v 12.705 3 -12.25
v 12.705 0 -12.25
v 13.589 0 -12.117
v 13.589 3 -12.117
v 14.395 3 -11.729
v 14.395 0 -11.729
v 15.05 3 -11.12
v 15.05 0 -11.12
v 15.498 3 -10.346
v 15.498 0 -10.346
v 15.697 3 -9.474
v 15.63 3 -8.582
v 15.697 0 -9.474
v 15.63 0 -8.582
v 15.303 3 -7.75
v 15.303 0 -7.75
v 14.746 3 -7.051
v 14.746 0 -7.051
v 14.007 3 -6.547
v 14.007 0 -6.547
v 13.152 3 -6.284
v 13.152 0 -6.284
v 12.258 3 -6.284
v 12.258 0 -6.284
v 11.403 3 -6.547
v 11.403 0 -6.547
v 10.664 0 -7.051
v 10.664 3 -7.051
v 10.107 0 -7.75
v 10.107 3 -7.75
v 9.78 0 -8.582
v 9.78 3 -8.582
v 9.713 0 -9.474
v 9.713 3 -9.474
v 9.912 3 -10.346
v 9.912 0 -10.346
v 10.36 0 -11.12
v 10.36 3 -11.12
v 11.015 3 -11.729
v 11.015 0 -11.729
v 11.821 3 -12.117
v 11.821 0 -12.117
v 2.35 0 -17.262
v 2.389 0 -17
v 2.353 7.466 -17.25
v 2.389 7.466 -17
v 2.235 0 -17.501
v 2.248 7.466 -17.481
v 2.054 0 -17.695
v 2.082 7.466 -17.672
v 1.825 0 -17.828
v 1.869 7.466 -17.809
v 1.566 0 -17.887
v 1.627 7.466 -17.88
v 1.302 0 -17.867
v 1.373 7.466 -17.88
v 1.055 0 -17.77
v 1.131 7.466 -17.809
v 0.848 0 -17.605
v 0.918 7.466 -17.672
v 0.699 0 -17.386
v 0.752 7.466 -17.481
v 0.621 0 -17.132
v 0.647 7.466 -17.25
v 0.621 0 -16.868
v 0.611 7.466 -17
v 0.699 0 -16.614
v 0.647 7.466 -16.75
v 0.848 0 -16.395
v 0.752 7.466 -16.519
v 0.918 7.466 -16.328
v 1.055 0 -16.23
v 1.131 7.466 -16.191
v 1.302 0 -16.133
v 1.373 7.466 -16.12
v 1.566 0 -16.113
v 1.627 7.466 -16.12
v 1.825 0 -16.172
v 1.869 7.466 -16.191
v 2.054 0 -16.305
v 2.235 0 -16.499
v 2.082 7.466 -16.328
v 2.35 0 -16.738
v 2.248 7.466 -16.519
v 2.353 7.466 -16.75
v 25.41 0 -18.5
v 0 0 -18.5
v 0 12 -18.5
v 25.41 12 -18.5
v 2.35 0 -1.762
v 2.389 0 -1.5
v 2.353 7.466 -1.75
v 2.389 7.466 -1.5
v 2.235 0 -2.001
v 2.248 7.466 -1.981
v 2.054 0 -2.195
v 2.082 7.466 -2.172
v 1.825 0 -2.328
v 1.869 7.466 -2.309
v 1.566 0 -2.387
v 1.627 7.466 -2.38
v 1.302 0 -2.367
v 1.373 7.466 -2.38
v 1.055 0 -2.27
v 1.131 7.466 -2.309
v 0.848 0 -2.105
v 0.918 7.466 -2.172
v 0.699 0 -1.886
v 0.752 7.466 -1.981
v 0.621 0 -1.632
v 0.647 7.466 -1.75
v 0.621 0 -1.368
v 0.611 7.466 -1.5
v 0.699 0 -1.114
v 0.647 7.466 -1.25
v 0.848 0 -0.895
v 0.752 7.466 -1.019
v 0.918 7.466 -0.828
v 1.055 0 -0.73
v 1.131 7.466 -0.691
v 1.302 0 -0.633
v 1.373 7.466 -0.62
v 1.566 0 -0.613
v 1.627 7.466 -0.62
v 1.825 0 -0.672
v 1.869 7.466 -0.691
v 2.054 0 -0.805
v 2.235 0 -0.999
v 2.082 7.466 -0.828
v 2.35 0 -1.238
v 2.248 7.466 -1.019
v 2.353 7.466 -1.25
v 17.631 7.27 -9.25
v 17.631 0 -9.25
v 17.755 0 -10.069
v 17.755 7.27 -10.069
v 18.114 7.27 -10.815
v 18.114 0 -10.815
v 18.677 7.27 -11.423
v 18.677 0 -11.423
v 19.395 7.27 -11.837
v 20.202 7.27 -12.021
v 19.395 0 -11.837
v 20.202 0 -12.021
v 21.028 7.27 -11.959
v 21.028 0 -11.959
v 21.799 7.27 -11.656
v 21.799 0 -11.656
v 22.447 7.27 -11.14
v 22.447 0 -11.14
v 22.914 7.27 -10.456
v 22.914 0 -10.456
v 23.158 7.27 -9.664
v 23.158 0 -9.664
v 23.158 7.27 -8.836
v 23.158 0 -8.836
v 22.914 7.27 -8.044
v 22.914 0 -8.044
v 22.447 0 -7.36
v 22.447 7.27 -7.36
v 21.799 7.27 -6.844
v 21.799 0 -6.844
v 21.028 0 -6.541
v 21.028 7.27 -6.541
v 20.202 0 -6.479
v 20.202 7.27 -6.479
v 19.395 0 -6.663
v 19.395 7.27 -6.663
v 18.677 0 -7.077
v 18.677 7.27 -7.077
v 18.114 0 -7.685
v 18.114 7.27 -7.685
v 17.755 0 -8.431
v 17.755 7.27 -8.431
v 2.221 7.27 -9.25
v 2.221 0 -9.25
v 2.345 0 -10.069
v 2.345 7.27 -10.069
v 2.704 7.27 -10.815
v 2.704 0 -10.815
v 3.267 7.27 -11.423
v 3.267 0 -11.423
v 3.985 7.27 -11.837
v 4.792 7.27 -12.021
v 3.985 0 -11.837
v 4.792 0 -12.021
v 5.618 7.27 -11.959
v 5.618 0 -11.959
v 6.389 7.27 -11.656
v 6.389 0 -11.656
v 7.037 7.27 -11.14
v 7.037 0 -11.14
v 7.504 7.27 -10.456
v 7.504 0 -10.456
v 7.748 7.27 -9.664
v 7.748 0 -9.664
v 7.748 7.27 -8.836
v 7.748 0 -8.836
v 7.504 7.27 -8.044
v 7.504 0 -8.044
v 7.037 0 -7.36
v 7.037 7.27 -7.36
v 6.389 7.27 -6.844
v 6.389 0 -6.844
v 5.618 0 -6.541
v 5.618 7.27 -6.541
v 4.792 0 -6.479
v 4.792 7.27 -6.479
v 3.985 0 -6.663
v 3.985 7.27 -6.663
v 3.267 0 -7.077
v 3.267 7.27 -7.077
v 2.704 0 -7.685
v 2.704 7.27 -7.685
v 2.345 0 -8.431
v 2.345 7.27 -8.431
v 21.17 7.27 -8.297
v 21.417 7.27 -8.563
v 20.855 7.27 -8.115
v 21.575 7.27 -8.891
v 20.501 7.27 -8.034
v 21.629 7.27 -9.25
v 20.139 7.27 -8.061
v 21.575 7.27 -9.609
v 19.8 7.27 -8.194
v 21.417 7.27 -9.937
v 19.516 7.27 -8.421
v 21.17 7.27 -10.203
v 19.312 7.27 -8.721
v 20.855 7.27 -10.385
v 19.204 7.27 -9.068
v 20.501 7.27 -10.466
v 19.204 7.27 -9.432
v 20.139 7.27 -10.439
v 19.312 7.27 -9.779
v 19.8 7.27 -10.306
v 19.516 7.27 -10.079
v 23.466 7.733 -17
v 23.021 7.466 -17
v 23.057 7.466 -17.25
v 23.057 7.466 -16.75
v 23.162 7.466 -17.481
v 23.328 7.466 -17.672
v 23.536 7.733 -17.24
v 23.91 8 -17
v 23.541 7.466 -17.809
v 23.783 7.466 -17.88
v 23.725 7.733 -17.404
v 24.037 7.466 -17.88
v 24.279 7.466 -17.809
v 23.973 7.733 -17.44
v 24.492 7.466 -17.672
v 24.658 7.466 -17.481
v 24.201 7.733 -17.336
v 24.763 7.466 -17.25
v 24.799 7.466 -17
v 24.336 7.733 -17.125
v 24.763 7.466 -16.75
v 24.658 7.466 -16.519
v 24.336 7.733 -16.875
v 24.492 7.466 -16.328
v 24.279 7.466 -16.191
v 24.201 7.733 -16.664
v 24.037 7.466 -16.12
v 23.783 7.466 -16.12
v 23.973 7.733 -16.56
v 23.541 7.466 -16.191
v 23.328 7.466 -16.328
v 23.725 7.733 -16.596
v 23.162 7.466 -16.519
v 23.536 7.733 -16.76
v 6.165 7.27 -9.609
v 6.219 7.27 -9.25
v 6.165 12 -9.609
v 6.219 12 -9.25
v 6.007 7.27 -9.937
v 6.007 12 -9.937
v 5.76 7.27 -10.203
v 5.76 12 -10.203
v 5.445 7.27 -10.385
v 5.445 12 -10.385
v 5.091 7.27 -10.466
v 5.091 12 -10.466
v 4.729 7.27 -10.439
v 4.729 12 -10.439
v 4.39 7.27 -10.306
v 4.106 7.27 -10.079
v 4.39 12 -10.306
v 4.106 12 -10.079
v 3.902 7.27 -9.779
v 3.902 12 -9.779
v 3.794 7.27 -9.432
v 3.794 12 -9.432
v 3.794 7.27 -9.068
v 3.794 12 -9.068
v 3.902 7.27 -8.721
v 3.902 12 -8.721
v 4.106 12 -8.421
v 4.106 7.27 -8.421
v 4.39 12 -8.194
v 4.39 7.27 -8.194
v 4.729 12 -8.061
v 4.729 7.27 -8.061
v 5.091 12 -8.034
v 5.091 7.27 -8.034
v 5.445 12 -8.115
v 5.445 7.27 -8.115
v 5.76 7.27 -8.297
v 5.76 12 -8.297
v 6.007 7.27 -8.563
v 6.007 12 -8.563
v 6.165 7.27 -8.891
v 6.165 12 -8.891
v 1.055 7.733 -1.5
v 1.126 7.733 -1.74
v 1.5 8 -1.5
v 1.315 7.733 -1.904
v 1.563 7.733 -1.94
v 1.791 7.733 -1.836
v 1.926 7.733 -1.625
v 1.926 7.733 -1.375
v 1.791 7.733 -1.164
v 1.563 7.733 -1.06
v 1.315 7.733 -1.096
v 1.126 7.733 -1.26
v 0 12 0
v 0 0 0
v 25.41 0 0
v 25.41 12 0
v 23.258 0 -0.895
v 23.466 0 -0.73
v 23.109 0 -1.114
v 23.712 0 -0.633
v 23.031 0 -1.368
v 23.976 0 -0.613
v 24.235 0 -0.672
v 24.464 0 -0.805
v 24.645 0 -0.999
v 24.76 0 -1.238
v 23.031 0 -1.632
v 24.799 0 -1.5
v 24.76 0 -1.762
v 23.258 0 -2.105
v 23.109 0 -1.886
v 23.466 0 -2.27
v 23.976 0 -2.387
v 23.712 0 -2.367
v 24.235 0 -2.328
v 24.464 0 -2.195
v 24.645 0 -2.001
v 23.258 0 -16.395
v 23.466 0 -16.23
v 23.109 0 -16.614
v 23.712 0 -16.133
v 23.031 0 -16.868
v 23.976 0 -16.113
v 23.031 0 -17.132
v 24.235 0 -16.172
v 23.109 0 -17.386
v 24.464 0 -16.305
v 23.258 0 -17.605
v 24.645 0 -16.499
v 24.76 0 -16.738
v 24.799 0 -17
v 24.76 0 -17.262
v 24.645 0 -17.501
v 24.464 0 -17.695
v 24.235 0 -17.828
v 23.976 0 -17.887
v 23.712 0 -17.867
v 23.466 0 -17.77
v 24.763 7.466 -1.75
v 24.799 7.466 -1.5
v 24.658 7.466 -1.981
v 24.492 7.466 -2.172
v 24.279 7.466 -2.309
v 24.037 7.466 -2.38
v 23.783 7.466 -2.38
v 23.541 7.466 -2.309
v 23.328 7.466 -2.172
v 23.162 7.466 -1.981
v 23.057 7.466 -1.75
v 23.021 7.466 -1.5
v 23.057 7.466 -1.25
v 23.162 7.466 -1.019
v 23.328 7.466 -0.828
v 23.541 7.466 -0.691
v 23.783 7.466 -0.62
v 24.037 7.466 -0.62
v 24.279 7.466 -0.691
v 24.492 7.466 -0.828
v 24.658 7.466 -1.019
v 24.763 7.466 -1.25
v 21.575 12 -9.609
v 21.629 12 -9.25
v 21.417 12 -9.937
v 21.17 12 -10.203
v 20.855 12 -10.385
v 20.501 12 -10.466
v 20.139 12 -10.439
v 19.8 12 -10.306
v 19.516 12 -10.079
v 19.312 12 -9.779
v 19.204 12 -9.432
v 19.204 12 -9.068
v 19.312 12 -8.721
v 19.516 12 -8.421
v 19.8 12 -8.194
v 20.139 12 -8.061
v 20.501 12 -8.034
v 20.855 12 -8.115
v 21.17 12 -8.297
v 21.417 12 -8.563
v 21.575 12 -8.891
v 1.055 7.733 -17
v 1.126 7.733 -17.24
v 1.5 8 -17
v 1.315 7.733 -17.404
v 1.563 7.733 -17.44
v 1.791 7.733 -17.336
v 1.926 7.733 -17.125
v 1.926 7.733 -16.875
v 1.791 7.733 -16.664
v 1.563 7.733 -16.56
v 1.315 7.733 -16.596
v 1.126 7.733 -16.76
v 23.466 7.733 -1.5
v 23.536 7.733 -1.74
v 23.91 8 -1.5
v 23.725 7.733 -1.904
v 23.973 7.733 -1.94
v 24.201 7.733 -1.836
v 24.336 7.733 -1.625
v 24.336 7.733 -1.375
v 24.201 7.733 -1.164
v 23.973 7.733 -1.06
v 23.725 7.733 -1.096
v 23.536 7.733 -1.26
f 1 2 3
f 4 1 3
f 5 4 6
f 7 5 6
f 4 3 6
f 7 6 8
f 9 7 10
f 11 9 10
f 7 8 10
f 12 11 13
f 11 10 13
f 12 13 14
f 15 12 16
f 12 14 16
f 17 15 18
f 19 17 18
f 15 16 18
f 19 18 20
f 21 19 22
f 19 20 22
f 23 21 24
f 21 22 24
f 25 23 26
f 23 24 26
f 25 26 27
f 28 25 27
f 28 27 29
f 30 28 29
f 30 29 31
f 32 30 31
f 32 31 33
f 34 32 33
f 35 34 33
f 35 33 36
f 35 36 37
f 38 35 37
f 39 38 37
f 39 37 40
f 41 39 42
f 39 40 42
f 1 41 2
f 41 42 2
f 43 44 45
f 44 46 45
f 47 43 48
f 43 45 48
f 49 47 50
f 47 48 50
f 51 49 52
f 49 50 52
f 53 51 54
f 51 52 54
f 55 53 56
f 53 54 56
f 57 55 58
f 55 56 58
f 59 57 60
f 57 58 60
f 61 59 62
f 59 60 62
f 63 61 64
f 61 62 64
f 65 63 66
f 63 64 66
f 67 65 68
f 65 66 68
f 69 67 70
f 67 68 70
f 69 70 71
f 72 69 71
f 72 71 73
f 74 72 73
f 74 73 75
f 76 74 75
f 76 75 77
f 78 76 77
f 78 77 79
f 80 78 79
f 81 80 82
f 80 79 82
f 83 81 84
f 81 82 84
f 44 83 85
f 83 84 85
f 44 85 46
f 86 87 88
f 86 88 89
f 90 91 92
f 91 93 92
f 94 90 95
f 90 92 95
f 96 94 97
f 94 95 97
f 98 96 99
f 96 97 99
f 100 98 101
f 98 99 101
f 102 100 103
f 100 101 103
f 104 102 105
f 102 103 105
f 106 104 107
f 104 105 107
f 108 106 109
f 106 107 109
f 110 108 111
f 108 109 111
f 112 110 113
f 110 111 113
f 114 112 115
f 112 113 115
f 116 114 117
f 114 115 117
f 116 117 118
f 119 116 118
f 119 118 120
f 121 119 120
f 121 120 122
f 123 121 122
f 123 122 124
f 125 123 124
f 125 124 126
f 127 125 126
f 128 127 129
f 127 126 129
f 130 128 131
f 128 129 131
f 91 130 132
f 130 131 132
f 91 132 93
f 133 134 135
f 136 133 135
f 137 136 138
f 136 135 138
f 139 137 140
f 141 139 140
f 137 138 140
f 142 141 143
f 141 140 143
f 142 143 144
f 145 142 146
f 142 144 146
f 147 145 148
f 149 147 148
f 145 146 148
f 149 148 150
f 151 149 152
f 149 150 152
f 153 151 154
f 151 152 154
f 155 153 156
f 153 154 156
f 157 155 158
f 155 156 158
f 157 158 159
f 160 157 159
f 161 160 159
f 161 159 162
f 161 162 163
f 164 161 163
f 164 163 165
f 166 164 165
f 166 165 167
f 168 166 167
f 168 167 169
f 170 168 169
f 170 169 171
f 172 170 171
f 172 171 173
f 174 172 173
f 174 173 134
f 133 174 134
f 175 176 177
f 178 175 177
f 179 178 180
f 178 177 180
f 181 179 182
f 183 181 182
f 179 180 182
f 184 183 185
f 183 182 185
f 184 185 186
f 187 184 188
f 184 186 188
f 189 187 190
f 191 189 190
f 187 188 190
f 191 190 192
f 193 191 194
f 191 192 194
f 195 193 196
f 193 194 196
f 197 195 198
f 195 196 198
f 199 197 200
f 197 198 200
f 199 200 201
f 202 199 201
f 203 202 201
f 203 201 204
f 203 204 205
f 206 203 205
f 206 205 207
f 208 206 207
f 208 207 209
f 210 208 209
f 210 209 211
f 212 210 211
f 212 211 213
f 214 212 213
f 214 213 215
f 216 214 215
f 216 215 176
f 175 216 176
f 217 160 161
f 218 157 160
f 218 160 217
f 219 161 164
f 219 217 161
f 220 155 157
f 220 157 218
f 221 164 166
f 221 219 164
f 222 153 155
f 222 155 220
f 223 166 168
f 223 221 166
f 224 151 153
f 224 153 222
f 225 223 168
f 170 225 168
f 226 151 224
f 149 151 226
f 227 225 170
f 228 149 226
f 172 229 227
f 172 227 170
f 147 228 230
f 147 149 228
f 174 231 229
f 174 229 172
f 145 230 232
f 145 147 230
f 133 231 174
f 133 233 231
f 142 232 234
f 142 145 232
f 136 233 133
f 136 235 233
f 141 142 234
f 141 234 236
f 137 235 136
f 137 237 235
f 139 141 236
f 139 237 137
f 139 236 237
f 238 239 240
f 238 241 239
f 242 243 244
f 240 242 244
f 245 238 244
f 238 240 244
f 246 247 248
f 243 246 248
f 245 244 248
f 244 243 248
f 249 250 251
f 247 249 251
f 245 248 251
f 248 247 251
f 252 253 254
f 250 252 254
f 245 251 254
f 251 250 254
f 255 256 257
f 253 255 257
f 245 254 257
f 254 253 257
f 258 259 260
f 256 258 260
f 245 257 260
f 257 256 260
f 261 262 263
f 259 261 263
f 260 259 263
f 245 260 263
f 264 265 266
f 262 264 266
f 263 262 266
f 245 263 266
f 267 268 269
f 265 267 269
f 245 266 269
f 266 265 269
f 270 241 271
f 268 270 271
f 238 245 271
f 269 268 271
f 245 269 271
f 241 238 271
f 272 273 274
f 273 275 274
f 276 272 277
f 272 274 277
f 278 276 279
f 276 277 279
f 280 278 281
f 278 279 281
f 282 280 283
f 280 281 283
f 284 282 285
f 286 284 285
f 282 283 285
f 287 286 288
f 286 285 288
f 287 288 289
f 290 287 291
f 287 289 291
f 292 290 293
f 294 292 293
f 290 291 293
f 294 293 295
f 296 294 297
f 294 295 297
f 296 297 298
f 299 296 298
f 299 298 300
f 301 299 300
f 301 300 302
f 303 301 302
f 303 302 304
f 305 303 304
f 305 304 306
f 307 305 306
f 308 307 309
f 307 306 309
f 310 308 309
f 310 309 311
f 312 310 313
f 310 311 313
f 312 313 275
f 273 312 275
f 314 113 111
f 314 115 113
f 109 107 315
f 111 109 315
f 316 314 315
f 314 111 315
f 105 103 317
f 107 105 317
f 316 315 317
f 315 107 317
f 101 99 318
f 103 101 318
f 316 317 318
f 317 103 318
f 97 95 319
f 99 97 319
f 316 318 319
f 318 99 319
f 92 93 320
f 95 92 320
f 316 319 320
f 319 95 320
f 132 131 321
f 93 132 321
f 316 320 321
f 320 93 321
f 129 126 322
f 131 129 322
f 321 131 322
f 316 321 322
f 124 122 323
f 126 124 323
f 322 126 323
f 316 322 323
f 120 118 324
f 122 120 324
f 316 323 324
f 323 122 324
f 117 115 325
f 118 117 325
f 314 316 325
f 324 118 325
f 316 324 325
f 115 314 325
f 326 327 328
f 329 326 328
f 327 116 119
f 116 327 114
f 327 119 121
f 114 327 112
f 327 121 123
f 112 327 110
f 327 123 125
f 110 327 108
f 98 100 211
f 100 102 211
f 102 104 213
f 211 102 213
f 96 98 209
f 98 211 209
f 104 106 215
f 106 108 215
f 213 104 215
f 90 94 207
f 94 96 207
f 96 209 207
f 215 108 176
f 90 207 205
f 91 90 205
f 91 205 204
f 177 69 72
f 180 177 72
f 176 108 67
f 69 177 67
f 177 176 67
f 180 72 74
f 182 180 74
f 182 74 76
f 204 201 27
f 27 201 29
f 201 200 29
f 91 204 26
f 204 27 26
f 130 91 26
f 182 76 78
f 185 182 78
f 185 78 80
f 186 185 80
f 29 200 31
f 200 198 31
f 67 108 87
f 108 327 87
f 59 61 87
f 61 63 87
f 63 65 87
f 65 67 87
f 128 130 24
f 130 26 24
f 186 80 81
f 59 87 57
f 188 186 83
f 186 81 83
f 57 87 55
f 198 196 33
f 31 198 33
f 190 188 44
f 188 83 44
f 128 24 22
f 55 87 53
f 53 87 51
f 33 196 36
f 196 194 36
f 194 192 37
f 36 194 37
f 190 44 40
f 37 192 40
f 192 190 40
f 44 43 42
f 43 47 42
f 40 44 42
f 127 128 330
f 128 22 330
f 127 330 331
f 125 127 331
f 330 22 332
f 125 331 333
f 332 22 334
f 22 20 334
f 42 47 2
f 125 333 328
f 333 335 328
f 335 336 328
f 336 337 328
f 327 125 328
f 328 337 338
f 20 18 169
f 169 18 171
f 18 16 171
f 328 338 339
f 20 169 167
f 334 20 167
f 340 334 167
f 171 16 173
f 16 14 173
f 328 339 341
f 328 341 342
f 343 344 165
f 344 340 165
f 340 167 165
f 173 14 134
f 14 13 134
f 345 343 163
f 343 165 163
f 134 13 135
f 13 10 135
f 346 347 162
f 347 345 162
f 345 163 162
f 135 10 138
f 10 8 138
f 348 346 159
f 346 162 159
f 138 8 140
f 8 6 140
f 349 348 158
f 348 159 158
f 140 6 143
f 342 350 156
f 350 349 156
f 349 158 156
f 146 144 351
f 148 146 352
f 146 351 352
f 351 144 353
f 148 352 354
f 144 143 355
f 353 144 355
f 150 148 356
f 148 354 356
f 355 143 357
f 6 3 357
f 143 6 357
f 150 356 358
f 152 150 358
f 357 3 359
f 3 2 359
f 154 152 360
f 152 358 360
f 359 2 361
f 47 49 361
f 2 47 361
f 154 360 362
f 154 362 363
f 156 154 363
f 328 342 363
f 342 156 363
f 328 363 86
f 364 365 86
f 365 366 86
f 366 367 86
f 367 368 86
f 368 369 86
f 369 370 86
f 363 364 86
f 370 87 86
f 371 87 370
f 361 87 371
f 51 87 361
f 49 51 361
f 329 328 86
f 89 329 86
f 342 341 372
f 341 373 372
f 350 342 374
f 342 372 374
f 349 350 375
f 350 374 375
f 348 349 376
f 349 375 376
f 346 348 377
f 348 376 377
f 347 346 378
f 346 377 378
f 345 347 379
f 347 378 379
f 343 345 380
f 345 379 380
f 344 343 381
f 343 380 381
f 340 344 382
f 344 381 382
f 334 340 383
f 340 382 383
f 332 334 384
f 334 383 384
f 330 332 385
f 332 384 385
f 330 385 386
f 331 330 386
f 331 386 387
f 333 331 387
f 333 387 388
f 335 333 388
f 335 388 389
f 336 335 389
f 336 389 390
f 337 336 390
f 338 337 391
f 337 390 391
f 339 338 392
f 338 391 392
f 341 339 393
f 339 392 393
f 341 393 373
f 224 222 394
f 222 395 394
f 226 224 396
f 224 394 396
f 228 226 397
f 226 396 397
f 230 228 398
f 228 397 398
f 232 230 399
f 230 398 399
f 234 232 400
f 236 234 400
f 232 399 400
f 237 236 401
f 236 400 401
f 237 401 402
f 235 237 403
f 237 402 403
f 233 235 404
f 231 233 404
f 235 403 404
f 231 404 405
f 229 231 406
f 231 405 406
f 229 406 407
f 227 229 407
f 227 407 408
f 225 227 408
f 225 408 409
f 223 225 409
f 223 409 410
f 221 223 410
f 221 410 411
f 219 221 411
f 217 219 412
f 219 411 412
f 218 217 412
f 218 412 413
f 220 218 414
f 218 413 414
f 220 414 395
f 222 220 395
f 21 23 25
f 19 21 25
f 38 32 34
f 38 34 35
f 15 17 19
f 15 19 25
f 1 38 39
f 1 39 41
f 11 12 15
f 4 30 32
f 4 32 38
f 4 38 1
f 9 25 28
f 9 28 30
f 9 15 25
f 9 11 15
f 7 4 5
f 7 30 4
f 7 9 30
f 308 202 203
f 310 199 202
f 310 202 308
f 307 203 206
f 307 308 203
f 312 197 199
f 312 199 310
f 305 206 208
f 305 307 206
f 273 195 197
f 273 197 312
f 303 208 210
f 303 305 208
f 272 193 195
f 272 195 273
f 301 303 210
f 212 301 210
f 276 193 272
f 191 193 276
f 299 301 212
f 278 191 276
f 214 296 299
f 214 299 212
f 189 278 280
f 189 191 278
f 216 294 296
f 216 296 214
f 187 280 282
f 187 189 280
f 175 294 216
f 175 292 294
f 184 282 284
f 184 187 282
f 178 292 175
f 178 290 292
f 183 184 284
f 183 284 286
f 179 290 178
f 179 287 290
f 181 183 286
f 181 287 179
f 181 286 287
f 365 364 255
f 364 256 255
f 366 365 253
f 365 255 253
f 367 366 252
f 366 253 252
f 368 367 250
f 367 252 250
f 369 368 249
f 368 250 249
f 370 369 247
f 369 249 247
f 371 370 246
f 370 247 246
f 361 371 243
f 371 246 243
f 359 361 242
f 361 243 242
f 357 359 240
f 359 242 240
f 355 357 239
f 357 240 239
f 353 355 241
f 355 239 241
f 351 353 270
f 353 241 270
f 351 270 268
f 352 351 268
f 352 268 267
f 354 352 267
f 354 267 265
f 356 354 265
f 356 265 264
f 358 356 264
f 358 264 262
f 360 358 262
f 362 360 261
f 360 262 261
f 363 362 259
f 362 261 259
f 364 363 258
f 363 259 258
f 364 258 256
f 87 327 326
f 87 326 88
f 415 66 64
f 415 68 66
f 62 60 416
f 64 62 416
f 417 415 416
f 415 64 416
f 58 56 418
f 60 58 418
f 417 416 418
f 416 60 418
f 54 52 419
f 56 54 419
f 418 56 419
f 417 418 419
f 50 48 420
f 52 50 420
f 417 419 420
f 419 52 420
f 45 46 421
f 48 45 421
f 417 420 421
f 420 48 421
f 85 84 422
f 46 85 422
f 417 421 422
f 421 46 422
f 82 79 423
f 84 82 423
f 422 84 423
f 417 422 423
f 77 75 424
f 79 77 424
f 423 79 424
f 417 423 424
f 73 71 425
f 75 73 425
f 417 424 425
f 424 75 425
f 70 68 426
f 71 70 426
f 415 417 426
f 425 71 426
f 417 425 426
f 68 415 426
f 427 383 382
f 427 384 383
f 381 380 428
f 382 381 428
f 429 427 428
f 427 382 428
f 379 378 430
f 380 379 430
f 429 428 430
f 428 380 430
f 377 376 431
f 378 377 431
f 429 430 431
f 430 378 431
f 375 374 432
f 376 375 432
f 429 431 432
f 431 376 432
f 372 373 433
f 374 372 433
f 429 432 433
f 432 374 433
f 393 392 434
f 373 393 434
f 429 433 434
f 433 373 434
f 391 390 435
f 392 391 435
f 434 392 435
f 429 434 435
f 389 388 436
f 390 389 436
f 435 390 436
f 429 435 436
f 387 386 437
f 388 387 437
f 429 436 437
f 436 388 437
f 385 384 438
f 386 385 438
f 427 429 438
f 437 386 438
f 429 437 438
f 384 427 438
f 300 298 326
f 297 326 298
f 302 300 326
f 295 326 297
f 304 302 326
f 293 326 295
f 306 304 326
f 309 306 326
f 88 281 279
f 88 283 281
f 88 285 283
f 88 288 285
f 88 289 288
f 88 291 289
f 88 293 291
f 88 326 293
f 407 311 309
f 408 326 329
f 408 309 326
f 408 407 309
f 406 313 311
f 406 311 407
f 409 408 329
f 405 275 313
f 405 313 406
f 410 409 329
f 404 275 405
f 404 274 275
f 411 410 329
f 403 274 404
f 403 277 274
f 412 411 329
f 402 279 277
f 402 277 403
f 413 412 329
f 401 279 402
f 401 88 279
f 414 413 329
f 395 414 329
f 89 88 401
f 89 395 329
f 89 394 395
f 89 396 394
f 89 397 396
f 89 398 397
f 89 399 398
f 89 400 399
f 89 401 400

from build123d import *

# Parameters (mm, degrees)
SKETCH1_W                                           = 25.41
SKETCH1_H                                           = 18.5
BOSS_EXTRUDE1_DEPTH                                 = 12
F_2_56_TAPPED_HOLE1_D                               = 1.778
F_2_56_TAPPED_HOLE1_DEPTH                           = 7.46583491
F_2_56_TAPPED_HOLE1_TIP                             = 0.53416509
SKETCH5_R                                           = 3
CUT_EXTRUDE1_DEPTH                                  = 3
CBORE_FOR_2_BINDING_HEAD_MACHINE_SCREW2_D           = 2.4384
CBORE_FOR_2_BINDING_HEAD_MACHINE_SCREW2_CBORE_D     = 5.55752
CBORE_FOR_2_BINDING_HEAD_MACHINE_SCREW2_CBORE_DEPTH = 7.269988


with BuildPart() as part:
    # Sketch1 → Boss-Extrude1 (new body)
    with BuildSketch(Plane(origin=(0, 0, 0), x_dir=(1, 0, 0), z_dir=(0, 1, 0))):
        with Locations((12.705, 9.25)):
            Rectangle(SKETCH1_W, SKETCH1_H)
    extrude(amount=BOSS_EXTRUDE1_DEPTH)

    # #2-56 Tapped Hole1
    with Locations(Plane(origin=(0, 0, 0), x_dir=(-1, 0, 0), z_dir=(0, -1, 0))):
        with Locations((-23.91, 17), (-23.91, 1.5), (-1.5, 1.5), (-1.5, 17)):
            Hole(F_2_56_TAPPED_HOLE1_D / 2, depth=F_2_56_TAPPED_HOLE1_DEPTH)
            with Locations((0, 0, -(F_2_56_TAPPED_HOLE1_DEPTH + F_2_56_TAPPED_HOLE1_TIP / 2))):  # 118° drill point
                Cone(0, F_2_56_TAPPED_HOLE1_D / 2, F_2_56_TAPPED_HOLE1_TIP, mode=Mode.SUBTRACT)

    # Sketch5 → Cut-Extrude1 (cut)
    with BuildSketch(Plane.XZ):
        with Locations(Location((12.705, -9.25, 0), (0, 0, 270))):
            Circle(SKETCH5_R)
    extrude(amount=-CUT_EXTRUDE1_DEPTH, mode=Mode.SUBTRACT)

    # CBORE for #2 Binding Head Machine Screw2 (through all)
    with Locations(Plane(origin=(0, 0, 0), x_dir=(-1, 0, 0), z_dir=(0, -1, 0))):
        with Locations((-20.41, 9.25), (-5, 9.25)):
            CounterBoreHole(CBORE_FOR_2_BINDING_HEAD_MACHINE_SCREW2_D / 2, CBORE_FOR_2_BINDING_HEAD_MACHINE_SCREW2_CBORE_D / 2, CBORE_FOR_2_BINDING_HEAD_MACHINE_SCREW2_CBORE_DEPTH)


solid = part.part
